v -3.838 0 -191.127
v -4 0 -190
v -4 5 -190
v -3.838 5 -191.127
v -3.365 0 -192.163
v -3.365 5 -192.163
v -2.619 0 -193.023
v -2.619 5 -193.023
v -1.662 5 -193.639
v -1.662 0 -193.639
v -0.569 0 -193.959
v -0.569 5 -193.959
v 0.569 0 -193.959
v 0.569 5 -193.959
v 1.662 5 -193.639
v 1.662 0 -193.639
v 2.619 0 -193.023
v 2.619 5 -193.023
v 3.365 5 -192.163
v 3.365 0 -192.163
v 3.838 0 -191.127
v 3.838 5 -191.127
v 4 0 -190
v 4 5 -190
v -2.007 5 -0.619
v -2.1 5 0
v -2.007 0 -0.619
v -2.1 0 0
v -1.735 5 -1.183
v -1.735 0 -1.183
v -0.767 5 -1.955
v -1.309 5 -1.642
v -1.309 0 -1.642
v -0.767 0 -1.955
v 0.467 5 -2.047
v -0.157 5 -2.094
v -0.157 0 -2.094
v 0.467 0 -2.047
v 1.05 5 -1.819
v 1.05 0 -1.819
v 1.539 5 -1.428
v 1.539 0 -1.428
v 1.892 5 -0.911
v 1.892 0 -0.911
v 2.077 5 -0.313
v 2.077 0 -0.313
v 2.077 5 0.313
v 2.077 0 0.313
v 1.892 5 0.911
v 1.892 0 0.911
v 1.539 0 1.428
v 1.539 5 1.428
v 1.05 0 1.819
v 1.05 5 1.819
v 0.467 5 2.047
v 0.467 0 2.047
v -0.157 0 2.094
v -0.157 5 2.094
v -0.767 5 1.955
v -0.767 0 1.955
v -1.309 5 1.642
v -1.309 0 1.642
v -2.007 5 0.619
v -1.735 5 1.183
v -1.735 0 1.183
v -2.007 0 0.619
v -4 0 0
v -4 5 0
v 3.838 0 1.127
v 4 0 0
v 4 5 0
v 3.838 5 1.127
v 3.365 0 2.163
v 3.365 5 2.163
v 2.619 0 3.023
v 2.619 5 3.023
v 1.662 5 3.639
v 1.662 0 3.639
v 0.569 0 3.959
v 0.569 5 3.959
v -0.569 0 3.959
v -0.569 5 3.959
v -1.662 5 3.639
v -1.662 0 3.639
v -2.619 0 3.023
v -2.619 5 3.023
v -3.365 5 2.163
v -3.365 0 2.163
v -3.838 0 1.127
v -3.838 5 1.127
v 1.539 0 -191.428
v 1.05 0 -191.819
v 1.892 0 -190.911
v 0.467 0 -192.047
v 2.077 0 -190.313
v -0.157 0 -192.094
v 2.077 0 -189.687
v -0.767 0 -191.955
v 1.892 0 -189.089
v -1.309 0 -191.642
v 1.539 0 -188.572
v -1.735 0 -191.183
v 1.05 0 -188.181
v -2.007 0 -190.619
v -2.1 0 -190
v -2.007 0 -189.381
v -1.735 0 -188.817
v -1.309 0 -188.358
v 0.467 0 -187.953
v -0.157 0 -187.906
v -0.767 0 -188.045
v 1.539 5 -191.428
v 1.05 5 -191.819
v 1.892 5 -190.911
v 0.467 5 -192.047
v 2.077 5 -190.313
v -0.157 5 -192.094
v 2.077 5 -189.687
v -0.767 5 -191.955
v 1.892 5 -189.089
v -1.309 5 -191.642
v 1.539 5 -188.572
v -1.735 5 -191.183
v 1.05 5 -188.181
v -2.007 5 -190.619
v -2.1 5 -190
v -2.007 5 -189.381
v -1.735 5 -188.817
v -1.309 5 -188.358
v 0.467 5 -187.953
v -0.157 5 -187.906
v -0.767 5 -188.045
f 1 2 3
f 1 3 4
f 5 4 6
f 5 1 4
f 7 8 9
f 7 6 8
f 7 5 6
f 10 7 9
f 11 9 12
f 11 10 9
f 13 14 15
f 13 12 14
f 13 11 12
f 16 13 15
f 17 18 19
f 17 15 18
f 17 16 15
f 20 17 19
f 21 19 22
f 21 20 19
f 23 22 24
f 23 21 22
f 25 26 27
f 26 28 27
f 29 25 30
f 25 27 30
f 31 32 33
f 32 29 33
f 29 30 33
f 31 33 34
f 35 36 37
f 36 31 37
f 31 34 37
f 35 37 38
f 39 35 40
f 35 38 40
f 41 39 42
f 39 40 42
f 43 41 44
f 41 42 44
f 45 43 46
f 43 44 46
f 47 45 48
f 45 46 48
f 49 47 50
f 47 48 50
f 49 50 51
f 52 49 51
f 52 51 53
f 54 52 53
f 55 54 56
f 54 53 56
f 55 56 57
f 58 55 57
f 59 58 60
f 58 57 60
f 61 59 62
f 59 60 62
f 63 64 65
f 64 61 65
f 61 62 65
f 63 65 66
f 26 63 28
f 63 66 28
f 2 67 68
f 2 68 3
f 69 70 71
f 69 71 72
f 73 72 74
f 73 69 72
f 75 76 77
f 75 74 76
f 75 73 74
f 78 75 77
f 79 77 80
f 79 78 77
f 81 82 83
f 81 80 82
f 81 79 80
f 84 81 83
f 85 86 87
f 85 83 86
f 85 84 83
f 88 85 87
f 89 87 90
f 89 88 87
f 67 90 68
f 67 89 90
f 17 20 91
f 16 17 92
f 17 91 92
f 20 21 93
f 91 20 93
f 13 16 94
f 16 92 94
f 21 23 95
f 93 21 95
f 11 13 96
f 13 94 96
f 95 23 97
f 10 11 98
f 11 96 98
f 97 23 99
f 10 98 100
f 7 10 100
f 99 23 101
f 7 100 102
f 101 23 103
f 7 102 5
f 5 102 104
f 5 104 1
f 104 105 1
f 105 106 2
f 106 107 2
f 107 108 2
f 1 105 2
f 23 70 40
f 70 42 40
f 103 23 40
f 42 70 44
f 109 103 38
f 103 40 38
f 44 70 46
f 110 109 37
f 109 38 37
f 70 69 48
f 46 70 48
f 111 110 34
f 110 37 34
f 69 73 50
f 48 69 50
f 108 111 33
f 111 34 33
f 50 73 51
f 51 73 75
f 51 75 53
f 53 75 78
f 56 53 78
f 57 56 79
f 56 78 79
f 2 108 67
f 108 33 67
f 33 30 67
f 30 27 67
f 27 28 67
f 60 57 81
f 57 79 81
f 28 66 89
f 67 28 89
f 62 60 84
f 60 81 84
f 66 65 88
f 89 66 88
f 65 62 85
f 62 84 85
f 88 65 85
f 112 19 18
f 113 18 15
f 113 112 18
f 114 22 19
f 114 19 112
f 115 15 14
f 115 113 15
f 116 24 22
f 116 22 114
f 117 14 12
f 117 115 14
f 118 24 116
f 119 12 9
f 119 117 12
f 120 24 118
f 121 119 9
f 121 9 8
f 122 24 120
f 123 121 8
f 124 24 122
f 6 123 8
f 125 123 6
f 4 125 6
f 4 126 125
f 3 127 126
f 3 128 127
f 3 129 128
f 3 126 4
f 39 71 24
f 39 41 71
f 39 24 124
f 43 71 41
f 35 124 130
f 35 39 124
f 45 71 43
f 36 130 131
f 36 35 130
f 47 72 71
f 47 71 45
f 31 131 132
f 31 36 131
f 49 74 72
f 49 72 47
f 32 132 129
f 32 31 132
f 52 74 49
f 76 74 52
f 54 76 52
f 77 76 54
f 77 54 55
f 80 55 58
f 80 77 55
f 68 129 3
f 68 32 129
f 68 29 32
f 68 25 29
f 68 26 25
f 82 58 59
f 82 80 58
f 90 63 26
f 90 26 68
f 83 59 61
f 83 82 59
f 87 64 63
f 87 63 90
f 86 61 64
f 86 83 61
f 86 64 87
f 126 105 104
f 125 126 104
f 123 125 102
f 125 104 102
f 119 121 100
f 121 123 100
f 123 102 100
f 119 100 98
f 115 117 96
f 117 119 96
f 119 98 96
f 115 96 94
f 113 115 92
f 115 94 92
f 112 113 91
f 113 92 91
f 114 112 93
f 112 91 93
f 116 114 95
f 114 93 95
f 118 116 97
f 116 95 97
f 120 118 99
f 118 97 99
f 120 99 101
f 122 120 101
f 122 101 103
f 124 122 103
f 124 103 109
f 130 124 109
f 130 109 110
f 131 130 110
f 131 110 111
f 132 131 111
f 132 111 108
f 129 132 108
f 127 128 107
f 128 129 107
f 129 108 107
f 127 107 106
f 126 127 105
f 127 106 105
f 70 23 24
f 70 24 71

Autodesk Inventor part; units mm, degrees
ref_plane "YZ Plane" through (0, 0, 0) normal (1, 0, 0) x (0, 1, 0)
ref_plane "XZ Plane" through (0, 0, 0) normal (0, 1, 0) x (-1, 0, 0)
ref_plane "XY Plane" through (0, 0, 0) normal (0, 0, 1) x (1, 0, 0)
sketch "Sketch1" plane through (0, 0, 0) normal (0, 1, 0) x (-1, 0, 0)
  line L0 (0, 0) -> (0, -190) construction
  line L1 (4, 0) -> (4, -190)
  line L2 (-4, -190) -> (-4, 0)
  arc A0 (4, 0) -> (-4, 0) centre (0, 0) ccw
  arc A1 (-4, -190) -> (4, -190) centre (0, -190) ccw
  circle A2 centre (0, 0) radius 2.1
  circle A3 centre (0, -190) radius 2.1
  point P0 (0, -95)
  dimension "d0" = 190
  dimension "d1" = 8
  dimension "d2" = 4.2
  dimension "d3" = 4.2
extrude "Extrusion1" add sketch "Sketch1" along normal blind 5
